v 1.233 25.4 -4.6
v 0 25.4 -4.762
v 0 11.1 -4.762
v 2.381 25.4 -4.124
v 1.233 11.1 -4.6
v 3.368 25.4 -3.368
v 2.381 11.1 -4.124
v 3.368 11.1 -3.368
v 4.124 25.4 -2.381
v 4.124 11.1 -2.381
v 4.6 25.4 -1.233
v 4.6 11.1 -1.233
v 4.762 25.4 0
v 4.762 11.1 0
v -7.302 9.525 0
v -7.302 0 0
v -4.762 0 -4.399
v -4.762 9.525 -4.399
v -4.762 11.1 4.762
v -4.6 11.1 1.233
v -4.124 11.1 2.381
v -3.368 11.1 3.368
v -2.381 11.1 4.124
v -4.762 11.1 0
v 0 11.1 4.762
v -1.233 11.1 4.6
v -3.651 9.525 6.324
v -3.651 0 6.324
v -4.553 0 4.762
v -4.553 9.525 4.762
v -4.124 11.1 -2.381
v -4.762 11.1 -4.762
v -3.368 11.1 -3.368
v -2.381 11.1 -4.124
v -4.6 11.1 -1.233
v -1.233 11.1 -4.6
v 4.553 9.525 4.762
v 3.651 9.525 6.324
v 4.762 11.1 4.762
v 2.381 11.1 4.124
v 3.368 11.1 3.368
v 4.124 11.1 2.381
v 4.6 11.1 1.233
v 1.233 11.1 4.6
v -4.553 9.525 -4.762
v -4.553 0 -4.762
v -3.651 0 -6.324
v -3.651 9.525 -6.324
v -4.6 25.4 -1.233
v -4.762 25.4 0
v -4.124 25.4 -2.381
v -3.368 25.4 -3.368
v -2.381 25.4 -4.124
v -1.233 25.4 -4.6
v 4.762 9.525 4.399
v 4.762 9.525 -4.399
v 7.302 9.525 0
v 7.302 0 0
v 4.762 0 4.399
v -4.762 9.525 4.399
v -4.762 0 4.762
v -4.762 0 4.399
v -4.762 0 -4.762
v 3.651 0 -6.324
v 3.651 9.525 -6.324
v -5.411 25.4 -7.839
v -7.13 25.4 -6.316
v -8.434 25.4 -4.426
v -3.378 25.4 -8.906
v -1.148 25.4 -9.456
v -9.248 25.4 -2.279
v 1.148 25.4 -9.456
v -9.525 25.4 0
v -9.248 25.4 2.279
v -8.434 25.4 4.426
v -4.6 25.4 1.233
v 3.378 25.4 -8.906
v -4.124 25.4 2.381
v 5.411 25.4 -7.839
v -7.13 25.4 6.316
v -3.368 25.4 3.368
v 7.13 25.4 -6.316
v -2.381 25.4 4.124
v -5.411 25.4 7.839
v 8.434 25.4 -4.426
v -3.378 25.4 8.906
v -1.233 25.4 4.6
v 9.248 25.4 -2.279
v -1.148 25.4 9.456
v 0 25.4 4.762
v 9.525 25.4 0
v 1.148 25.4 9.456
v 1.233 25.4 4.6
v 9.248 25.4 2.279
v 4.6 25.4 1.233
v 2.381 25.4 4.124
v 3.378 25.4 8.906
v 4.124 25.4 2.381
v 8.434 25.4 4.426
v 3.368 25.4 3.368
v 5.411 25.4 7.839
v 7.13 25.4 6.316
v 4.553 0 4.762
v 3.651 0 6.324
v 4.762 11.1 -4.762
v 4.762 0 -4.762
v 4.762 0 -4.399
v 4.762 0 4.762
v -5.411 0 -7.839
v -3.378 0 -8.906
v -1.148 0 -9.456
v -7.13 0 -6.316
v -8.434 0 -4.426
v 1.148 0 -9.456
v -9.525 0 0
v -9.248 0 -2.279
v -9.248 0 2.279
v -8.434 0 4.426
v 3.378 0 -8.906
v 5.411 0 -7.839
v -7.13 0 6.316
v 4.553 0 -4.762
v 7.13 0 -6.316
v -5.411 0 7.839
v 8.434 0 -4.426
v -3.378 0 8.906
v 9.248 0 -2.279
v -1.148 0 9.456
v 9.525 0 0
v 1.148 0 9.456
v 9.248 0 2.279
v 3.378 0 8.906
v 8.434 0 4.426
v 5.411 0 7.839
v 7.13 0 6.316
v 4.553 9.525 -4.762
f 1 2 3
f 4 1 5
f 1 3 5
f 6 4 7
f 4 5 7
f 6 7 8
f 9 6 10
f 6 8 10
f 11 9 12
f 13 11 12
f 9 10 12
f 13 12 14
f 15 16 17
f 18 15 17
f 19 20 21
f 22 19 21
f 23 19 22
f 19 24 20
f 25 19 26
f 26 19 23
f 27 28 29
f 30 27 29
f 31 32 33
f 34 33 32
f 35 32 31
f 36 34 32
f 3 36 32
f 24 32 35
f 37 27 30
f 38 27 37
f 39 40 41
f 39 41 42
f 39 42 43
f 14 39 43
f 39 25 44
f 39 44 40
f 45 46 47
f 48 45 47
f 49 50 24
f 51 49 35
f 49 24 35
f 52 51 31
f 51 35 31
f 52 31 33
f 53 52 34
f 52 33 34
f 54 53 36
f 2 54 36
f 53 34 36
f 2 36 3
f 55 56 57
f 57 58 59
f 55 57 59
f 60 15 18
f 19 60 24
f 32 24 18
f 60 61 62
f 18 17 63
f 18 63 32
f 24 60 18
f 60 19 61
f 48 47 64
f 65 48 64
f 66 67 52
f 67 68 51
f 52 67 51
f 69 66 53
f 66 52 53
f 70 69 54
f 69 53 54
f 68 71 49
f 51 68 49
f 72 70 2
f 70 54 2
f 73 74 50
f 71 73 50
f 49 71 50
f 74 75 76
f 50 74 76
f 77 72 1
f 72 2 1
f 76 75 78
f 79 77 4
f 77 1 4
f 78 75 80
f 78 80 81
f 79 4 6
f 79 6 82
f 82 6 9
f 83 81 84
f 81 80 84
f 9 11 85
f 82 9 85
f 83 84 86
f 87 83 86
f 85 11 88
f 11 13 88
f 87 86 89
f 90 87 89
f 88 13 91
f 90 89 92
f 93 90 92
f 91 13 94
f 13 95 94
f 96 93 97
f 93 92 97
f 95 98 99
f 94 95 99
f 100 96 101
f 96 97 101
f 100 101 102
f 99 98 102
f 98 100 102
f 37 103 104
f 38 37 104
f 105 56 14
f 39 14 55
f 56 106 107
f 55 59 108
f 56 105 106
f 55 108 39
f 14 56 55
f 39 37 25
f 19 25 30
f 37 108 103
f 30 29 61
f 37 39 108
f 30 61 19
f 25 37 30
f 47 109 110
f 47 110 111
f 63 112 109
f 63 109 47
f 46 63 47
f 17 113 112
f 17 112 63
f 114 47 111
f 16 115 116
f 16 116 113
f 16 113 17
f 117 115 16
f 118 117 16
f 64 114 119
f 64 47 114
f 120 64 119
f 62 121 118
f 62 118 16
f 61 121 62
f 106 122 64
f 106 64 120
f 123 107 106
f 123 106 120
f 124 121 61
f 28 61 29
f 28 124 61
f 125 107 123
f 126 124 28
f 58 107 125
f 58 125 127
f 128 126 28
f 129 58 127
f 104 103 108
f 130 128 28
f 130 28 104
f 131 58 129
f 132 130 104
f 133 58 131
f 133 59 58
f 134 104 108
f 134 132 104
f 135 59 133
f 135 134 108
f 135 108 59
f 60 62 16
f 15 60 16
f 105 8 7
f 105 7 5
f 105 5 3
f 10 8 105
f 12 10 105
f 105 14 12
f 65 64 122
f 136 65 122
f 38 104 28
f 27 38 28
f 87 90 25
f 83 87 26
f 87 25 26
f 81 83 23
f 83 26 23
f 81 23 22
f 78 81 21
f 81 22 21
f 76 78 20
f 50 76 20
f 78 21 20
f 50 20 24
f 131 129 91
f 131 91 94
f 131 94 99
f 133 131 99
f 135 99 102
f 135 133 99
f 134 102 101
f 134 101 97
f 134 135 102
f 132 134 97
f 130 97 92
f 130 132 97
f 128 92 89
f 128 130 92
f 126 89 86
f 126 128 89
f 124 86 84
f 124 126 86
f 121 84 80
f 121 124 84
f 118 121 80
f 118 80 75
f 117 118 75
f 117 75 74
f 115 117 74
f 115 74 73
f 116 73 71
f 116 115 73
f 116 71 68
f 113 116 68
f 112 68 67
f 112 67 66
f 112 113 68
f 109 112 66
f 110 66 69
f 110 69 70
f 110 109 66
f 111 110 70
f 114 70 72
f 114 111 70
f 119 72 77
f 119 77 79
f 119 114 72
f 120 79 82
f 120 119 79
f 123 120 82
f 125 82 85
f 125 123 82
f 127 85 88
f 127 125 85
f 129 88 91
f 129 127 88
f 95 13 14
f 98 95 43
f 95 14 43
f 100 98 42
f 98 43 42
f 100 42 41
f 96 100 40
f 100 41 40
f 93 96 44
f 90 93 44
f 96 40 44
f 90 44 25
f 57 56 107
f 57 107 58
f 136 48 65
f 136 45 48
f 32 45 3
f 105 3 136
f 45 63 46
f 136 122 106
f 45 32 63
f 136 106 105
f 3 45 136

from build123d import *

# Parameters (mm, degrees)
F0_R     = 9.525
F1_DEPTH = 25.4
F3_DEPTH = 25.401
F4_DEPTH = 11.0998
F6_DEPTH = 9.525


with BuildPart() as f1:
    # F0 (on Front) → F1 (new body)
    with BuildSketch(Plane.XZ):
        Circle(F0_R)
    extrude(amount=-F1_DEPTH)

    # F2 (on Front) → F3 (cut, through all)
    with BuildSketch(Plane.XZ):
        with BuildLine():
            ThreePointArc((-4.7625, 0), (-3.367596, -3.367596), (0, -4.7625))
            ThreePointArc((0, -4.7625), (3.367596, -3.367596), (4.7625, 0))
            ThreePointArc((4.7625, 0), (3.367596, 3.367596), (0, 4.7625))
            ThreePointArc((0, 4.7625), (-3.367596, 3.367596), (-4.7625, 0))
        make_face()
    extrude(amount=-F3_DEPTH, mode=Mode.SUBTRACT)

    # F2 (on Front) → F4 (cut)
    with BuildSketch(Plane.XZ):
        with BuildLine():
            Line((0, -4.7625), (4.7625, -4.7625))
            Line((4.7625, -4.7625), (4.7625, 0))
            ThreePointArc((4.7625, 0), (3.367596, -3.367596), (0, -4.7625))
        make_face()
        with BuildLine():
            Line((-4.7625, -4.7625), (0, -4.7625))
            ThreePointArc((0, -4.7625), (-3.367596, -3.367596), (-4.7625, 0))
            Line((-4.7625, 0), (-4.7625, -4.7625))
        make_face()
        with BuildLine():
            ThreePointArc((0, 4.7625), (3.367596, 3.367596), (4.7625, 0))
            Line((4.7625, 0), (4.7625, 4.7625))
            Line((4.7625, 4.7625), (0, 4.7625))
        make_face()
        with BuildLine():
            Line((-4.7625, 4.7625), (-4.7625, 0))
            ThreePointArc((-4.7625, 0), (-3.367596, 3.367596), (0, 4.7625))
            Line((0, 4.7625), (-4.7625, 4.7625))
        make_face()
    extrude(amount=-F4_DEPTH, mode=Mode.SUBTRACT)

    # F5 (on Front) → F6 (cut)
    with BuildSketch(Plane.XZ):
        Polygon((3.65125, -6.324151), (7.3025, 0), (3.65125, 6.324151), (-3.65125, 6.324151), (-7.3025, 0), (-3.65125, -6.324151), align=None)
    extrude(amount=-F6_DEPTH, mode=Mode.SUBTRACT)


solid = f1.part
